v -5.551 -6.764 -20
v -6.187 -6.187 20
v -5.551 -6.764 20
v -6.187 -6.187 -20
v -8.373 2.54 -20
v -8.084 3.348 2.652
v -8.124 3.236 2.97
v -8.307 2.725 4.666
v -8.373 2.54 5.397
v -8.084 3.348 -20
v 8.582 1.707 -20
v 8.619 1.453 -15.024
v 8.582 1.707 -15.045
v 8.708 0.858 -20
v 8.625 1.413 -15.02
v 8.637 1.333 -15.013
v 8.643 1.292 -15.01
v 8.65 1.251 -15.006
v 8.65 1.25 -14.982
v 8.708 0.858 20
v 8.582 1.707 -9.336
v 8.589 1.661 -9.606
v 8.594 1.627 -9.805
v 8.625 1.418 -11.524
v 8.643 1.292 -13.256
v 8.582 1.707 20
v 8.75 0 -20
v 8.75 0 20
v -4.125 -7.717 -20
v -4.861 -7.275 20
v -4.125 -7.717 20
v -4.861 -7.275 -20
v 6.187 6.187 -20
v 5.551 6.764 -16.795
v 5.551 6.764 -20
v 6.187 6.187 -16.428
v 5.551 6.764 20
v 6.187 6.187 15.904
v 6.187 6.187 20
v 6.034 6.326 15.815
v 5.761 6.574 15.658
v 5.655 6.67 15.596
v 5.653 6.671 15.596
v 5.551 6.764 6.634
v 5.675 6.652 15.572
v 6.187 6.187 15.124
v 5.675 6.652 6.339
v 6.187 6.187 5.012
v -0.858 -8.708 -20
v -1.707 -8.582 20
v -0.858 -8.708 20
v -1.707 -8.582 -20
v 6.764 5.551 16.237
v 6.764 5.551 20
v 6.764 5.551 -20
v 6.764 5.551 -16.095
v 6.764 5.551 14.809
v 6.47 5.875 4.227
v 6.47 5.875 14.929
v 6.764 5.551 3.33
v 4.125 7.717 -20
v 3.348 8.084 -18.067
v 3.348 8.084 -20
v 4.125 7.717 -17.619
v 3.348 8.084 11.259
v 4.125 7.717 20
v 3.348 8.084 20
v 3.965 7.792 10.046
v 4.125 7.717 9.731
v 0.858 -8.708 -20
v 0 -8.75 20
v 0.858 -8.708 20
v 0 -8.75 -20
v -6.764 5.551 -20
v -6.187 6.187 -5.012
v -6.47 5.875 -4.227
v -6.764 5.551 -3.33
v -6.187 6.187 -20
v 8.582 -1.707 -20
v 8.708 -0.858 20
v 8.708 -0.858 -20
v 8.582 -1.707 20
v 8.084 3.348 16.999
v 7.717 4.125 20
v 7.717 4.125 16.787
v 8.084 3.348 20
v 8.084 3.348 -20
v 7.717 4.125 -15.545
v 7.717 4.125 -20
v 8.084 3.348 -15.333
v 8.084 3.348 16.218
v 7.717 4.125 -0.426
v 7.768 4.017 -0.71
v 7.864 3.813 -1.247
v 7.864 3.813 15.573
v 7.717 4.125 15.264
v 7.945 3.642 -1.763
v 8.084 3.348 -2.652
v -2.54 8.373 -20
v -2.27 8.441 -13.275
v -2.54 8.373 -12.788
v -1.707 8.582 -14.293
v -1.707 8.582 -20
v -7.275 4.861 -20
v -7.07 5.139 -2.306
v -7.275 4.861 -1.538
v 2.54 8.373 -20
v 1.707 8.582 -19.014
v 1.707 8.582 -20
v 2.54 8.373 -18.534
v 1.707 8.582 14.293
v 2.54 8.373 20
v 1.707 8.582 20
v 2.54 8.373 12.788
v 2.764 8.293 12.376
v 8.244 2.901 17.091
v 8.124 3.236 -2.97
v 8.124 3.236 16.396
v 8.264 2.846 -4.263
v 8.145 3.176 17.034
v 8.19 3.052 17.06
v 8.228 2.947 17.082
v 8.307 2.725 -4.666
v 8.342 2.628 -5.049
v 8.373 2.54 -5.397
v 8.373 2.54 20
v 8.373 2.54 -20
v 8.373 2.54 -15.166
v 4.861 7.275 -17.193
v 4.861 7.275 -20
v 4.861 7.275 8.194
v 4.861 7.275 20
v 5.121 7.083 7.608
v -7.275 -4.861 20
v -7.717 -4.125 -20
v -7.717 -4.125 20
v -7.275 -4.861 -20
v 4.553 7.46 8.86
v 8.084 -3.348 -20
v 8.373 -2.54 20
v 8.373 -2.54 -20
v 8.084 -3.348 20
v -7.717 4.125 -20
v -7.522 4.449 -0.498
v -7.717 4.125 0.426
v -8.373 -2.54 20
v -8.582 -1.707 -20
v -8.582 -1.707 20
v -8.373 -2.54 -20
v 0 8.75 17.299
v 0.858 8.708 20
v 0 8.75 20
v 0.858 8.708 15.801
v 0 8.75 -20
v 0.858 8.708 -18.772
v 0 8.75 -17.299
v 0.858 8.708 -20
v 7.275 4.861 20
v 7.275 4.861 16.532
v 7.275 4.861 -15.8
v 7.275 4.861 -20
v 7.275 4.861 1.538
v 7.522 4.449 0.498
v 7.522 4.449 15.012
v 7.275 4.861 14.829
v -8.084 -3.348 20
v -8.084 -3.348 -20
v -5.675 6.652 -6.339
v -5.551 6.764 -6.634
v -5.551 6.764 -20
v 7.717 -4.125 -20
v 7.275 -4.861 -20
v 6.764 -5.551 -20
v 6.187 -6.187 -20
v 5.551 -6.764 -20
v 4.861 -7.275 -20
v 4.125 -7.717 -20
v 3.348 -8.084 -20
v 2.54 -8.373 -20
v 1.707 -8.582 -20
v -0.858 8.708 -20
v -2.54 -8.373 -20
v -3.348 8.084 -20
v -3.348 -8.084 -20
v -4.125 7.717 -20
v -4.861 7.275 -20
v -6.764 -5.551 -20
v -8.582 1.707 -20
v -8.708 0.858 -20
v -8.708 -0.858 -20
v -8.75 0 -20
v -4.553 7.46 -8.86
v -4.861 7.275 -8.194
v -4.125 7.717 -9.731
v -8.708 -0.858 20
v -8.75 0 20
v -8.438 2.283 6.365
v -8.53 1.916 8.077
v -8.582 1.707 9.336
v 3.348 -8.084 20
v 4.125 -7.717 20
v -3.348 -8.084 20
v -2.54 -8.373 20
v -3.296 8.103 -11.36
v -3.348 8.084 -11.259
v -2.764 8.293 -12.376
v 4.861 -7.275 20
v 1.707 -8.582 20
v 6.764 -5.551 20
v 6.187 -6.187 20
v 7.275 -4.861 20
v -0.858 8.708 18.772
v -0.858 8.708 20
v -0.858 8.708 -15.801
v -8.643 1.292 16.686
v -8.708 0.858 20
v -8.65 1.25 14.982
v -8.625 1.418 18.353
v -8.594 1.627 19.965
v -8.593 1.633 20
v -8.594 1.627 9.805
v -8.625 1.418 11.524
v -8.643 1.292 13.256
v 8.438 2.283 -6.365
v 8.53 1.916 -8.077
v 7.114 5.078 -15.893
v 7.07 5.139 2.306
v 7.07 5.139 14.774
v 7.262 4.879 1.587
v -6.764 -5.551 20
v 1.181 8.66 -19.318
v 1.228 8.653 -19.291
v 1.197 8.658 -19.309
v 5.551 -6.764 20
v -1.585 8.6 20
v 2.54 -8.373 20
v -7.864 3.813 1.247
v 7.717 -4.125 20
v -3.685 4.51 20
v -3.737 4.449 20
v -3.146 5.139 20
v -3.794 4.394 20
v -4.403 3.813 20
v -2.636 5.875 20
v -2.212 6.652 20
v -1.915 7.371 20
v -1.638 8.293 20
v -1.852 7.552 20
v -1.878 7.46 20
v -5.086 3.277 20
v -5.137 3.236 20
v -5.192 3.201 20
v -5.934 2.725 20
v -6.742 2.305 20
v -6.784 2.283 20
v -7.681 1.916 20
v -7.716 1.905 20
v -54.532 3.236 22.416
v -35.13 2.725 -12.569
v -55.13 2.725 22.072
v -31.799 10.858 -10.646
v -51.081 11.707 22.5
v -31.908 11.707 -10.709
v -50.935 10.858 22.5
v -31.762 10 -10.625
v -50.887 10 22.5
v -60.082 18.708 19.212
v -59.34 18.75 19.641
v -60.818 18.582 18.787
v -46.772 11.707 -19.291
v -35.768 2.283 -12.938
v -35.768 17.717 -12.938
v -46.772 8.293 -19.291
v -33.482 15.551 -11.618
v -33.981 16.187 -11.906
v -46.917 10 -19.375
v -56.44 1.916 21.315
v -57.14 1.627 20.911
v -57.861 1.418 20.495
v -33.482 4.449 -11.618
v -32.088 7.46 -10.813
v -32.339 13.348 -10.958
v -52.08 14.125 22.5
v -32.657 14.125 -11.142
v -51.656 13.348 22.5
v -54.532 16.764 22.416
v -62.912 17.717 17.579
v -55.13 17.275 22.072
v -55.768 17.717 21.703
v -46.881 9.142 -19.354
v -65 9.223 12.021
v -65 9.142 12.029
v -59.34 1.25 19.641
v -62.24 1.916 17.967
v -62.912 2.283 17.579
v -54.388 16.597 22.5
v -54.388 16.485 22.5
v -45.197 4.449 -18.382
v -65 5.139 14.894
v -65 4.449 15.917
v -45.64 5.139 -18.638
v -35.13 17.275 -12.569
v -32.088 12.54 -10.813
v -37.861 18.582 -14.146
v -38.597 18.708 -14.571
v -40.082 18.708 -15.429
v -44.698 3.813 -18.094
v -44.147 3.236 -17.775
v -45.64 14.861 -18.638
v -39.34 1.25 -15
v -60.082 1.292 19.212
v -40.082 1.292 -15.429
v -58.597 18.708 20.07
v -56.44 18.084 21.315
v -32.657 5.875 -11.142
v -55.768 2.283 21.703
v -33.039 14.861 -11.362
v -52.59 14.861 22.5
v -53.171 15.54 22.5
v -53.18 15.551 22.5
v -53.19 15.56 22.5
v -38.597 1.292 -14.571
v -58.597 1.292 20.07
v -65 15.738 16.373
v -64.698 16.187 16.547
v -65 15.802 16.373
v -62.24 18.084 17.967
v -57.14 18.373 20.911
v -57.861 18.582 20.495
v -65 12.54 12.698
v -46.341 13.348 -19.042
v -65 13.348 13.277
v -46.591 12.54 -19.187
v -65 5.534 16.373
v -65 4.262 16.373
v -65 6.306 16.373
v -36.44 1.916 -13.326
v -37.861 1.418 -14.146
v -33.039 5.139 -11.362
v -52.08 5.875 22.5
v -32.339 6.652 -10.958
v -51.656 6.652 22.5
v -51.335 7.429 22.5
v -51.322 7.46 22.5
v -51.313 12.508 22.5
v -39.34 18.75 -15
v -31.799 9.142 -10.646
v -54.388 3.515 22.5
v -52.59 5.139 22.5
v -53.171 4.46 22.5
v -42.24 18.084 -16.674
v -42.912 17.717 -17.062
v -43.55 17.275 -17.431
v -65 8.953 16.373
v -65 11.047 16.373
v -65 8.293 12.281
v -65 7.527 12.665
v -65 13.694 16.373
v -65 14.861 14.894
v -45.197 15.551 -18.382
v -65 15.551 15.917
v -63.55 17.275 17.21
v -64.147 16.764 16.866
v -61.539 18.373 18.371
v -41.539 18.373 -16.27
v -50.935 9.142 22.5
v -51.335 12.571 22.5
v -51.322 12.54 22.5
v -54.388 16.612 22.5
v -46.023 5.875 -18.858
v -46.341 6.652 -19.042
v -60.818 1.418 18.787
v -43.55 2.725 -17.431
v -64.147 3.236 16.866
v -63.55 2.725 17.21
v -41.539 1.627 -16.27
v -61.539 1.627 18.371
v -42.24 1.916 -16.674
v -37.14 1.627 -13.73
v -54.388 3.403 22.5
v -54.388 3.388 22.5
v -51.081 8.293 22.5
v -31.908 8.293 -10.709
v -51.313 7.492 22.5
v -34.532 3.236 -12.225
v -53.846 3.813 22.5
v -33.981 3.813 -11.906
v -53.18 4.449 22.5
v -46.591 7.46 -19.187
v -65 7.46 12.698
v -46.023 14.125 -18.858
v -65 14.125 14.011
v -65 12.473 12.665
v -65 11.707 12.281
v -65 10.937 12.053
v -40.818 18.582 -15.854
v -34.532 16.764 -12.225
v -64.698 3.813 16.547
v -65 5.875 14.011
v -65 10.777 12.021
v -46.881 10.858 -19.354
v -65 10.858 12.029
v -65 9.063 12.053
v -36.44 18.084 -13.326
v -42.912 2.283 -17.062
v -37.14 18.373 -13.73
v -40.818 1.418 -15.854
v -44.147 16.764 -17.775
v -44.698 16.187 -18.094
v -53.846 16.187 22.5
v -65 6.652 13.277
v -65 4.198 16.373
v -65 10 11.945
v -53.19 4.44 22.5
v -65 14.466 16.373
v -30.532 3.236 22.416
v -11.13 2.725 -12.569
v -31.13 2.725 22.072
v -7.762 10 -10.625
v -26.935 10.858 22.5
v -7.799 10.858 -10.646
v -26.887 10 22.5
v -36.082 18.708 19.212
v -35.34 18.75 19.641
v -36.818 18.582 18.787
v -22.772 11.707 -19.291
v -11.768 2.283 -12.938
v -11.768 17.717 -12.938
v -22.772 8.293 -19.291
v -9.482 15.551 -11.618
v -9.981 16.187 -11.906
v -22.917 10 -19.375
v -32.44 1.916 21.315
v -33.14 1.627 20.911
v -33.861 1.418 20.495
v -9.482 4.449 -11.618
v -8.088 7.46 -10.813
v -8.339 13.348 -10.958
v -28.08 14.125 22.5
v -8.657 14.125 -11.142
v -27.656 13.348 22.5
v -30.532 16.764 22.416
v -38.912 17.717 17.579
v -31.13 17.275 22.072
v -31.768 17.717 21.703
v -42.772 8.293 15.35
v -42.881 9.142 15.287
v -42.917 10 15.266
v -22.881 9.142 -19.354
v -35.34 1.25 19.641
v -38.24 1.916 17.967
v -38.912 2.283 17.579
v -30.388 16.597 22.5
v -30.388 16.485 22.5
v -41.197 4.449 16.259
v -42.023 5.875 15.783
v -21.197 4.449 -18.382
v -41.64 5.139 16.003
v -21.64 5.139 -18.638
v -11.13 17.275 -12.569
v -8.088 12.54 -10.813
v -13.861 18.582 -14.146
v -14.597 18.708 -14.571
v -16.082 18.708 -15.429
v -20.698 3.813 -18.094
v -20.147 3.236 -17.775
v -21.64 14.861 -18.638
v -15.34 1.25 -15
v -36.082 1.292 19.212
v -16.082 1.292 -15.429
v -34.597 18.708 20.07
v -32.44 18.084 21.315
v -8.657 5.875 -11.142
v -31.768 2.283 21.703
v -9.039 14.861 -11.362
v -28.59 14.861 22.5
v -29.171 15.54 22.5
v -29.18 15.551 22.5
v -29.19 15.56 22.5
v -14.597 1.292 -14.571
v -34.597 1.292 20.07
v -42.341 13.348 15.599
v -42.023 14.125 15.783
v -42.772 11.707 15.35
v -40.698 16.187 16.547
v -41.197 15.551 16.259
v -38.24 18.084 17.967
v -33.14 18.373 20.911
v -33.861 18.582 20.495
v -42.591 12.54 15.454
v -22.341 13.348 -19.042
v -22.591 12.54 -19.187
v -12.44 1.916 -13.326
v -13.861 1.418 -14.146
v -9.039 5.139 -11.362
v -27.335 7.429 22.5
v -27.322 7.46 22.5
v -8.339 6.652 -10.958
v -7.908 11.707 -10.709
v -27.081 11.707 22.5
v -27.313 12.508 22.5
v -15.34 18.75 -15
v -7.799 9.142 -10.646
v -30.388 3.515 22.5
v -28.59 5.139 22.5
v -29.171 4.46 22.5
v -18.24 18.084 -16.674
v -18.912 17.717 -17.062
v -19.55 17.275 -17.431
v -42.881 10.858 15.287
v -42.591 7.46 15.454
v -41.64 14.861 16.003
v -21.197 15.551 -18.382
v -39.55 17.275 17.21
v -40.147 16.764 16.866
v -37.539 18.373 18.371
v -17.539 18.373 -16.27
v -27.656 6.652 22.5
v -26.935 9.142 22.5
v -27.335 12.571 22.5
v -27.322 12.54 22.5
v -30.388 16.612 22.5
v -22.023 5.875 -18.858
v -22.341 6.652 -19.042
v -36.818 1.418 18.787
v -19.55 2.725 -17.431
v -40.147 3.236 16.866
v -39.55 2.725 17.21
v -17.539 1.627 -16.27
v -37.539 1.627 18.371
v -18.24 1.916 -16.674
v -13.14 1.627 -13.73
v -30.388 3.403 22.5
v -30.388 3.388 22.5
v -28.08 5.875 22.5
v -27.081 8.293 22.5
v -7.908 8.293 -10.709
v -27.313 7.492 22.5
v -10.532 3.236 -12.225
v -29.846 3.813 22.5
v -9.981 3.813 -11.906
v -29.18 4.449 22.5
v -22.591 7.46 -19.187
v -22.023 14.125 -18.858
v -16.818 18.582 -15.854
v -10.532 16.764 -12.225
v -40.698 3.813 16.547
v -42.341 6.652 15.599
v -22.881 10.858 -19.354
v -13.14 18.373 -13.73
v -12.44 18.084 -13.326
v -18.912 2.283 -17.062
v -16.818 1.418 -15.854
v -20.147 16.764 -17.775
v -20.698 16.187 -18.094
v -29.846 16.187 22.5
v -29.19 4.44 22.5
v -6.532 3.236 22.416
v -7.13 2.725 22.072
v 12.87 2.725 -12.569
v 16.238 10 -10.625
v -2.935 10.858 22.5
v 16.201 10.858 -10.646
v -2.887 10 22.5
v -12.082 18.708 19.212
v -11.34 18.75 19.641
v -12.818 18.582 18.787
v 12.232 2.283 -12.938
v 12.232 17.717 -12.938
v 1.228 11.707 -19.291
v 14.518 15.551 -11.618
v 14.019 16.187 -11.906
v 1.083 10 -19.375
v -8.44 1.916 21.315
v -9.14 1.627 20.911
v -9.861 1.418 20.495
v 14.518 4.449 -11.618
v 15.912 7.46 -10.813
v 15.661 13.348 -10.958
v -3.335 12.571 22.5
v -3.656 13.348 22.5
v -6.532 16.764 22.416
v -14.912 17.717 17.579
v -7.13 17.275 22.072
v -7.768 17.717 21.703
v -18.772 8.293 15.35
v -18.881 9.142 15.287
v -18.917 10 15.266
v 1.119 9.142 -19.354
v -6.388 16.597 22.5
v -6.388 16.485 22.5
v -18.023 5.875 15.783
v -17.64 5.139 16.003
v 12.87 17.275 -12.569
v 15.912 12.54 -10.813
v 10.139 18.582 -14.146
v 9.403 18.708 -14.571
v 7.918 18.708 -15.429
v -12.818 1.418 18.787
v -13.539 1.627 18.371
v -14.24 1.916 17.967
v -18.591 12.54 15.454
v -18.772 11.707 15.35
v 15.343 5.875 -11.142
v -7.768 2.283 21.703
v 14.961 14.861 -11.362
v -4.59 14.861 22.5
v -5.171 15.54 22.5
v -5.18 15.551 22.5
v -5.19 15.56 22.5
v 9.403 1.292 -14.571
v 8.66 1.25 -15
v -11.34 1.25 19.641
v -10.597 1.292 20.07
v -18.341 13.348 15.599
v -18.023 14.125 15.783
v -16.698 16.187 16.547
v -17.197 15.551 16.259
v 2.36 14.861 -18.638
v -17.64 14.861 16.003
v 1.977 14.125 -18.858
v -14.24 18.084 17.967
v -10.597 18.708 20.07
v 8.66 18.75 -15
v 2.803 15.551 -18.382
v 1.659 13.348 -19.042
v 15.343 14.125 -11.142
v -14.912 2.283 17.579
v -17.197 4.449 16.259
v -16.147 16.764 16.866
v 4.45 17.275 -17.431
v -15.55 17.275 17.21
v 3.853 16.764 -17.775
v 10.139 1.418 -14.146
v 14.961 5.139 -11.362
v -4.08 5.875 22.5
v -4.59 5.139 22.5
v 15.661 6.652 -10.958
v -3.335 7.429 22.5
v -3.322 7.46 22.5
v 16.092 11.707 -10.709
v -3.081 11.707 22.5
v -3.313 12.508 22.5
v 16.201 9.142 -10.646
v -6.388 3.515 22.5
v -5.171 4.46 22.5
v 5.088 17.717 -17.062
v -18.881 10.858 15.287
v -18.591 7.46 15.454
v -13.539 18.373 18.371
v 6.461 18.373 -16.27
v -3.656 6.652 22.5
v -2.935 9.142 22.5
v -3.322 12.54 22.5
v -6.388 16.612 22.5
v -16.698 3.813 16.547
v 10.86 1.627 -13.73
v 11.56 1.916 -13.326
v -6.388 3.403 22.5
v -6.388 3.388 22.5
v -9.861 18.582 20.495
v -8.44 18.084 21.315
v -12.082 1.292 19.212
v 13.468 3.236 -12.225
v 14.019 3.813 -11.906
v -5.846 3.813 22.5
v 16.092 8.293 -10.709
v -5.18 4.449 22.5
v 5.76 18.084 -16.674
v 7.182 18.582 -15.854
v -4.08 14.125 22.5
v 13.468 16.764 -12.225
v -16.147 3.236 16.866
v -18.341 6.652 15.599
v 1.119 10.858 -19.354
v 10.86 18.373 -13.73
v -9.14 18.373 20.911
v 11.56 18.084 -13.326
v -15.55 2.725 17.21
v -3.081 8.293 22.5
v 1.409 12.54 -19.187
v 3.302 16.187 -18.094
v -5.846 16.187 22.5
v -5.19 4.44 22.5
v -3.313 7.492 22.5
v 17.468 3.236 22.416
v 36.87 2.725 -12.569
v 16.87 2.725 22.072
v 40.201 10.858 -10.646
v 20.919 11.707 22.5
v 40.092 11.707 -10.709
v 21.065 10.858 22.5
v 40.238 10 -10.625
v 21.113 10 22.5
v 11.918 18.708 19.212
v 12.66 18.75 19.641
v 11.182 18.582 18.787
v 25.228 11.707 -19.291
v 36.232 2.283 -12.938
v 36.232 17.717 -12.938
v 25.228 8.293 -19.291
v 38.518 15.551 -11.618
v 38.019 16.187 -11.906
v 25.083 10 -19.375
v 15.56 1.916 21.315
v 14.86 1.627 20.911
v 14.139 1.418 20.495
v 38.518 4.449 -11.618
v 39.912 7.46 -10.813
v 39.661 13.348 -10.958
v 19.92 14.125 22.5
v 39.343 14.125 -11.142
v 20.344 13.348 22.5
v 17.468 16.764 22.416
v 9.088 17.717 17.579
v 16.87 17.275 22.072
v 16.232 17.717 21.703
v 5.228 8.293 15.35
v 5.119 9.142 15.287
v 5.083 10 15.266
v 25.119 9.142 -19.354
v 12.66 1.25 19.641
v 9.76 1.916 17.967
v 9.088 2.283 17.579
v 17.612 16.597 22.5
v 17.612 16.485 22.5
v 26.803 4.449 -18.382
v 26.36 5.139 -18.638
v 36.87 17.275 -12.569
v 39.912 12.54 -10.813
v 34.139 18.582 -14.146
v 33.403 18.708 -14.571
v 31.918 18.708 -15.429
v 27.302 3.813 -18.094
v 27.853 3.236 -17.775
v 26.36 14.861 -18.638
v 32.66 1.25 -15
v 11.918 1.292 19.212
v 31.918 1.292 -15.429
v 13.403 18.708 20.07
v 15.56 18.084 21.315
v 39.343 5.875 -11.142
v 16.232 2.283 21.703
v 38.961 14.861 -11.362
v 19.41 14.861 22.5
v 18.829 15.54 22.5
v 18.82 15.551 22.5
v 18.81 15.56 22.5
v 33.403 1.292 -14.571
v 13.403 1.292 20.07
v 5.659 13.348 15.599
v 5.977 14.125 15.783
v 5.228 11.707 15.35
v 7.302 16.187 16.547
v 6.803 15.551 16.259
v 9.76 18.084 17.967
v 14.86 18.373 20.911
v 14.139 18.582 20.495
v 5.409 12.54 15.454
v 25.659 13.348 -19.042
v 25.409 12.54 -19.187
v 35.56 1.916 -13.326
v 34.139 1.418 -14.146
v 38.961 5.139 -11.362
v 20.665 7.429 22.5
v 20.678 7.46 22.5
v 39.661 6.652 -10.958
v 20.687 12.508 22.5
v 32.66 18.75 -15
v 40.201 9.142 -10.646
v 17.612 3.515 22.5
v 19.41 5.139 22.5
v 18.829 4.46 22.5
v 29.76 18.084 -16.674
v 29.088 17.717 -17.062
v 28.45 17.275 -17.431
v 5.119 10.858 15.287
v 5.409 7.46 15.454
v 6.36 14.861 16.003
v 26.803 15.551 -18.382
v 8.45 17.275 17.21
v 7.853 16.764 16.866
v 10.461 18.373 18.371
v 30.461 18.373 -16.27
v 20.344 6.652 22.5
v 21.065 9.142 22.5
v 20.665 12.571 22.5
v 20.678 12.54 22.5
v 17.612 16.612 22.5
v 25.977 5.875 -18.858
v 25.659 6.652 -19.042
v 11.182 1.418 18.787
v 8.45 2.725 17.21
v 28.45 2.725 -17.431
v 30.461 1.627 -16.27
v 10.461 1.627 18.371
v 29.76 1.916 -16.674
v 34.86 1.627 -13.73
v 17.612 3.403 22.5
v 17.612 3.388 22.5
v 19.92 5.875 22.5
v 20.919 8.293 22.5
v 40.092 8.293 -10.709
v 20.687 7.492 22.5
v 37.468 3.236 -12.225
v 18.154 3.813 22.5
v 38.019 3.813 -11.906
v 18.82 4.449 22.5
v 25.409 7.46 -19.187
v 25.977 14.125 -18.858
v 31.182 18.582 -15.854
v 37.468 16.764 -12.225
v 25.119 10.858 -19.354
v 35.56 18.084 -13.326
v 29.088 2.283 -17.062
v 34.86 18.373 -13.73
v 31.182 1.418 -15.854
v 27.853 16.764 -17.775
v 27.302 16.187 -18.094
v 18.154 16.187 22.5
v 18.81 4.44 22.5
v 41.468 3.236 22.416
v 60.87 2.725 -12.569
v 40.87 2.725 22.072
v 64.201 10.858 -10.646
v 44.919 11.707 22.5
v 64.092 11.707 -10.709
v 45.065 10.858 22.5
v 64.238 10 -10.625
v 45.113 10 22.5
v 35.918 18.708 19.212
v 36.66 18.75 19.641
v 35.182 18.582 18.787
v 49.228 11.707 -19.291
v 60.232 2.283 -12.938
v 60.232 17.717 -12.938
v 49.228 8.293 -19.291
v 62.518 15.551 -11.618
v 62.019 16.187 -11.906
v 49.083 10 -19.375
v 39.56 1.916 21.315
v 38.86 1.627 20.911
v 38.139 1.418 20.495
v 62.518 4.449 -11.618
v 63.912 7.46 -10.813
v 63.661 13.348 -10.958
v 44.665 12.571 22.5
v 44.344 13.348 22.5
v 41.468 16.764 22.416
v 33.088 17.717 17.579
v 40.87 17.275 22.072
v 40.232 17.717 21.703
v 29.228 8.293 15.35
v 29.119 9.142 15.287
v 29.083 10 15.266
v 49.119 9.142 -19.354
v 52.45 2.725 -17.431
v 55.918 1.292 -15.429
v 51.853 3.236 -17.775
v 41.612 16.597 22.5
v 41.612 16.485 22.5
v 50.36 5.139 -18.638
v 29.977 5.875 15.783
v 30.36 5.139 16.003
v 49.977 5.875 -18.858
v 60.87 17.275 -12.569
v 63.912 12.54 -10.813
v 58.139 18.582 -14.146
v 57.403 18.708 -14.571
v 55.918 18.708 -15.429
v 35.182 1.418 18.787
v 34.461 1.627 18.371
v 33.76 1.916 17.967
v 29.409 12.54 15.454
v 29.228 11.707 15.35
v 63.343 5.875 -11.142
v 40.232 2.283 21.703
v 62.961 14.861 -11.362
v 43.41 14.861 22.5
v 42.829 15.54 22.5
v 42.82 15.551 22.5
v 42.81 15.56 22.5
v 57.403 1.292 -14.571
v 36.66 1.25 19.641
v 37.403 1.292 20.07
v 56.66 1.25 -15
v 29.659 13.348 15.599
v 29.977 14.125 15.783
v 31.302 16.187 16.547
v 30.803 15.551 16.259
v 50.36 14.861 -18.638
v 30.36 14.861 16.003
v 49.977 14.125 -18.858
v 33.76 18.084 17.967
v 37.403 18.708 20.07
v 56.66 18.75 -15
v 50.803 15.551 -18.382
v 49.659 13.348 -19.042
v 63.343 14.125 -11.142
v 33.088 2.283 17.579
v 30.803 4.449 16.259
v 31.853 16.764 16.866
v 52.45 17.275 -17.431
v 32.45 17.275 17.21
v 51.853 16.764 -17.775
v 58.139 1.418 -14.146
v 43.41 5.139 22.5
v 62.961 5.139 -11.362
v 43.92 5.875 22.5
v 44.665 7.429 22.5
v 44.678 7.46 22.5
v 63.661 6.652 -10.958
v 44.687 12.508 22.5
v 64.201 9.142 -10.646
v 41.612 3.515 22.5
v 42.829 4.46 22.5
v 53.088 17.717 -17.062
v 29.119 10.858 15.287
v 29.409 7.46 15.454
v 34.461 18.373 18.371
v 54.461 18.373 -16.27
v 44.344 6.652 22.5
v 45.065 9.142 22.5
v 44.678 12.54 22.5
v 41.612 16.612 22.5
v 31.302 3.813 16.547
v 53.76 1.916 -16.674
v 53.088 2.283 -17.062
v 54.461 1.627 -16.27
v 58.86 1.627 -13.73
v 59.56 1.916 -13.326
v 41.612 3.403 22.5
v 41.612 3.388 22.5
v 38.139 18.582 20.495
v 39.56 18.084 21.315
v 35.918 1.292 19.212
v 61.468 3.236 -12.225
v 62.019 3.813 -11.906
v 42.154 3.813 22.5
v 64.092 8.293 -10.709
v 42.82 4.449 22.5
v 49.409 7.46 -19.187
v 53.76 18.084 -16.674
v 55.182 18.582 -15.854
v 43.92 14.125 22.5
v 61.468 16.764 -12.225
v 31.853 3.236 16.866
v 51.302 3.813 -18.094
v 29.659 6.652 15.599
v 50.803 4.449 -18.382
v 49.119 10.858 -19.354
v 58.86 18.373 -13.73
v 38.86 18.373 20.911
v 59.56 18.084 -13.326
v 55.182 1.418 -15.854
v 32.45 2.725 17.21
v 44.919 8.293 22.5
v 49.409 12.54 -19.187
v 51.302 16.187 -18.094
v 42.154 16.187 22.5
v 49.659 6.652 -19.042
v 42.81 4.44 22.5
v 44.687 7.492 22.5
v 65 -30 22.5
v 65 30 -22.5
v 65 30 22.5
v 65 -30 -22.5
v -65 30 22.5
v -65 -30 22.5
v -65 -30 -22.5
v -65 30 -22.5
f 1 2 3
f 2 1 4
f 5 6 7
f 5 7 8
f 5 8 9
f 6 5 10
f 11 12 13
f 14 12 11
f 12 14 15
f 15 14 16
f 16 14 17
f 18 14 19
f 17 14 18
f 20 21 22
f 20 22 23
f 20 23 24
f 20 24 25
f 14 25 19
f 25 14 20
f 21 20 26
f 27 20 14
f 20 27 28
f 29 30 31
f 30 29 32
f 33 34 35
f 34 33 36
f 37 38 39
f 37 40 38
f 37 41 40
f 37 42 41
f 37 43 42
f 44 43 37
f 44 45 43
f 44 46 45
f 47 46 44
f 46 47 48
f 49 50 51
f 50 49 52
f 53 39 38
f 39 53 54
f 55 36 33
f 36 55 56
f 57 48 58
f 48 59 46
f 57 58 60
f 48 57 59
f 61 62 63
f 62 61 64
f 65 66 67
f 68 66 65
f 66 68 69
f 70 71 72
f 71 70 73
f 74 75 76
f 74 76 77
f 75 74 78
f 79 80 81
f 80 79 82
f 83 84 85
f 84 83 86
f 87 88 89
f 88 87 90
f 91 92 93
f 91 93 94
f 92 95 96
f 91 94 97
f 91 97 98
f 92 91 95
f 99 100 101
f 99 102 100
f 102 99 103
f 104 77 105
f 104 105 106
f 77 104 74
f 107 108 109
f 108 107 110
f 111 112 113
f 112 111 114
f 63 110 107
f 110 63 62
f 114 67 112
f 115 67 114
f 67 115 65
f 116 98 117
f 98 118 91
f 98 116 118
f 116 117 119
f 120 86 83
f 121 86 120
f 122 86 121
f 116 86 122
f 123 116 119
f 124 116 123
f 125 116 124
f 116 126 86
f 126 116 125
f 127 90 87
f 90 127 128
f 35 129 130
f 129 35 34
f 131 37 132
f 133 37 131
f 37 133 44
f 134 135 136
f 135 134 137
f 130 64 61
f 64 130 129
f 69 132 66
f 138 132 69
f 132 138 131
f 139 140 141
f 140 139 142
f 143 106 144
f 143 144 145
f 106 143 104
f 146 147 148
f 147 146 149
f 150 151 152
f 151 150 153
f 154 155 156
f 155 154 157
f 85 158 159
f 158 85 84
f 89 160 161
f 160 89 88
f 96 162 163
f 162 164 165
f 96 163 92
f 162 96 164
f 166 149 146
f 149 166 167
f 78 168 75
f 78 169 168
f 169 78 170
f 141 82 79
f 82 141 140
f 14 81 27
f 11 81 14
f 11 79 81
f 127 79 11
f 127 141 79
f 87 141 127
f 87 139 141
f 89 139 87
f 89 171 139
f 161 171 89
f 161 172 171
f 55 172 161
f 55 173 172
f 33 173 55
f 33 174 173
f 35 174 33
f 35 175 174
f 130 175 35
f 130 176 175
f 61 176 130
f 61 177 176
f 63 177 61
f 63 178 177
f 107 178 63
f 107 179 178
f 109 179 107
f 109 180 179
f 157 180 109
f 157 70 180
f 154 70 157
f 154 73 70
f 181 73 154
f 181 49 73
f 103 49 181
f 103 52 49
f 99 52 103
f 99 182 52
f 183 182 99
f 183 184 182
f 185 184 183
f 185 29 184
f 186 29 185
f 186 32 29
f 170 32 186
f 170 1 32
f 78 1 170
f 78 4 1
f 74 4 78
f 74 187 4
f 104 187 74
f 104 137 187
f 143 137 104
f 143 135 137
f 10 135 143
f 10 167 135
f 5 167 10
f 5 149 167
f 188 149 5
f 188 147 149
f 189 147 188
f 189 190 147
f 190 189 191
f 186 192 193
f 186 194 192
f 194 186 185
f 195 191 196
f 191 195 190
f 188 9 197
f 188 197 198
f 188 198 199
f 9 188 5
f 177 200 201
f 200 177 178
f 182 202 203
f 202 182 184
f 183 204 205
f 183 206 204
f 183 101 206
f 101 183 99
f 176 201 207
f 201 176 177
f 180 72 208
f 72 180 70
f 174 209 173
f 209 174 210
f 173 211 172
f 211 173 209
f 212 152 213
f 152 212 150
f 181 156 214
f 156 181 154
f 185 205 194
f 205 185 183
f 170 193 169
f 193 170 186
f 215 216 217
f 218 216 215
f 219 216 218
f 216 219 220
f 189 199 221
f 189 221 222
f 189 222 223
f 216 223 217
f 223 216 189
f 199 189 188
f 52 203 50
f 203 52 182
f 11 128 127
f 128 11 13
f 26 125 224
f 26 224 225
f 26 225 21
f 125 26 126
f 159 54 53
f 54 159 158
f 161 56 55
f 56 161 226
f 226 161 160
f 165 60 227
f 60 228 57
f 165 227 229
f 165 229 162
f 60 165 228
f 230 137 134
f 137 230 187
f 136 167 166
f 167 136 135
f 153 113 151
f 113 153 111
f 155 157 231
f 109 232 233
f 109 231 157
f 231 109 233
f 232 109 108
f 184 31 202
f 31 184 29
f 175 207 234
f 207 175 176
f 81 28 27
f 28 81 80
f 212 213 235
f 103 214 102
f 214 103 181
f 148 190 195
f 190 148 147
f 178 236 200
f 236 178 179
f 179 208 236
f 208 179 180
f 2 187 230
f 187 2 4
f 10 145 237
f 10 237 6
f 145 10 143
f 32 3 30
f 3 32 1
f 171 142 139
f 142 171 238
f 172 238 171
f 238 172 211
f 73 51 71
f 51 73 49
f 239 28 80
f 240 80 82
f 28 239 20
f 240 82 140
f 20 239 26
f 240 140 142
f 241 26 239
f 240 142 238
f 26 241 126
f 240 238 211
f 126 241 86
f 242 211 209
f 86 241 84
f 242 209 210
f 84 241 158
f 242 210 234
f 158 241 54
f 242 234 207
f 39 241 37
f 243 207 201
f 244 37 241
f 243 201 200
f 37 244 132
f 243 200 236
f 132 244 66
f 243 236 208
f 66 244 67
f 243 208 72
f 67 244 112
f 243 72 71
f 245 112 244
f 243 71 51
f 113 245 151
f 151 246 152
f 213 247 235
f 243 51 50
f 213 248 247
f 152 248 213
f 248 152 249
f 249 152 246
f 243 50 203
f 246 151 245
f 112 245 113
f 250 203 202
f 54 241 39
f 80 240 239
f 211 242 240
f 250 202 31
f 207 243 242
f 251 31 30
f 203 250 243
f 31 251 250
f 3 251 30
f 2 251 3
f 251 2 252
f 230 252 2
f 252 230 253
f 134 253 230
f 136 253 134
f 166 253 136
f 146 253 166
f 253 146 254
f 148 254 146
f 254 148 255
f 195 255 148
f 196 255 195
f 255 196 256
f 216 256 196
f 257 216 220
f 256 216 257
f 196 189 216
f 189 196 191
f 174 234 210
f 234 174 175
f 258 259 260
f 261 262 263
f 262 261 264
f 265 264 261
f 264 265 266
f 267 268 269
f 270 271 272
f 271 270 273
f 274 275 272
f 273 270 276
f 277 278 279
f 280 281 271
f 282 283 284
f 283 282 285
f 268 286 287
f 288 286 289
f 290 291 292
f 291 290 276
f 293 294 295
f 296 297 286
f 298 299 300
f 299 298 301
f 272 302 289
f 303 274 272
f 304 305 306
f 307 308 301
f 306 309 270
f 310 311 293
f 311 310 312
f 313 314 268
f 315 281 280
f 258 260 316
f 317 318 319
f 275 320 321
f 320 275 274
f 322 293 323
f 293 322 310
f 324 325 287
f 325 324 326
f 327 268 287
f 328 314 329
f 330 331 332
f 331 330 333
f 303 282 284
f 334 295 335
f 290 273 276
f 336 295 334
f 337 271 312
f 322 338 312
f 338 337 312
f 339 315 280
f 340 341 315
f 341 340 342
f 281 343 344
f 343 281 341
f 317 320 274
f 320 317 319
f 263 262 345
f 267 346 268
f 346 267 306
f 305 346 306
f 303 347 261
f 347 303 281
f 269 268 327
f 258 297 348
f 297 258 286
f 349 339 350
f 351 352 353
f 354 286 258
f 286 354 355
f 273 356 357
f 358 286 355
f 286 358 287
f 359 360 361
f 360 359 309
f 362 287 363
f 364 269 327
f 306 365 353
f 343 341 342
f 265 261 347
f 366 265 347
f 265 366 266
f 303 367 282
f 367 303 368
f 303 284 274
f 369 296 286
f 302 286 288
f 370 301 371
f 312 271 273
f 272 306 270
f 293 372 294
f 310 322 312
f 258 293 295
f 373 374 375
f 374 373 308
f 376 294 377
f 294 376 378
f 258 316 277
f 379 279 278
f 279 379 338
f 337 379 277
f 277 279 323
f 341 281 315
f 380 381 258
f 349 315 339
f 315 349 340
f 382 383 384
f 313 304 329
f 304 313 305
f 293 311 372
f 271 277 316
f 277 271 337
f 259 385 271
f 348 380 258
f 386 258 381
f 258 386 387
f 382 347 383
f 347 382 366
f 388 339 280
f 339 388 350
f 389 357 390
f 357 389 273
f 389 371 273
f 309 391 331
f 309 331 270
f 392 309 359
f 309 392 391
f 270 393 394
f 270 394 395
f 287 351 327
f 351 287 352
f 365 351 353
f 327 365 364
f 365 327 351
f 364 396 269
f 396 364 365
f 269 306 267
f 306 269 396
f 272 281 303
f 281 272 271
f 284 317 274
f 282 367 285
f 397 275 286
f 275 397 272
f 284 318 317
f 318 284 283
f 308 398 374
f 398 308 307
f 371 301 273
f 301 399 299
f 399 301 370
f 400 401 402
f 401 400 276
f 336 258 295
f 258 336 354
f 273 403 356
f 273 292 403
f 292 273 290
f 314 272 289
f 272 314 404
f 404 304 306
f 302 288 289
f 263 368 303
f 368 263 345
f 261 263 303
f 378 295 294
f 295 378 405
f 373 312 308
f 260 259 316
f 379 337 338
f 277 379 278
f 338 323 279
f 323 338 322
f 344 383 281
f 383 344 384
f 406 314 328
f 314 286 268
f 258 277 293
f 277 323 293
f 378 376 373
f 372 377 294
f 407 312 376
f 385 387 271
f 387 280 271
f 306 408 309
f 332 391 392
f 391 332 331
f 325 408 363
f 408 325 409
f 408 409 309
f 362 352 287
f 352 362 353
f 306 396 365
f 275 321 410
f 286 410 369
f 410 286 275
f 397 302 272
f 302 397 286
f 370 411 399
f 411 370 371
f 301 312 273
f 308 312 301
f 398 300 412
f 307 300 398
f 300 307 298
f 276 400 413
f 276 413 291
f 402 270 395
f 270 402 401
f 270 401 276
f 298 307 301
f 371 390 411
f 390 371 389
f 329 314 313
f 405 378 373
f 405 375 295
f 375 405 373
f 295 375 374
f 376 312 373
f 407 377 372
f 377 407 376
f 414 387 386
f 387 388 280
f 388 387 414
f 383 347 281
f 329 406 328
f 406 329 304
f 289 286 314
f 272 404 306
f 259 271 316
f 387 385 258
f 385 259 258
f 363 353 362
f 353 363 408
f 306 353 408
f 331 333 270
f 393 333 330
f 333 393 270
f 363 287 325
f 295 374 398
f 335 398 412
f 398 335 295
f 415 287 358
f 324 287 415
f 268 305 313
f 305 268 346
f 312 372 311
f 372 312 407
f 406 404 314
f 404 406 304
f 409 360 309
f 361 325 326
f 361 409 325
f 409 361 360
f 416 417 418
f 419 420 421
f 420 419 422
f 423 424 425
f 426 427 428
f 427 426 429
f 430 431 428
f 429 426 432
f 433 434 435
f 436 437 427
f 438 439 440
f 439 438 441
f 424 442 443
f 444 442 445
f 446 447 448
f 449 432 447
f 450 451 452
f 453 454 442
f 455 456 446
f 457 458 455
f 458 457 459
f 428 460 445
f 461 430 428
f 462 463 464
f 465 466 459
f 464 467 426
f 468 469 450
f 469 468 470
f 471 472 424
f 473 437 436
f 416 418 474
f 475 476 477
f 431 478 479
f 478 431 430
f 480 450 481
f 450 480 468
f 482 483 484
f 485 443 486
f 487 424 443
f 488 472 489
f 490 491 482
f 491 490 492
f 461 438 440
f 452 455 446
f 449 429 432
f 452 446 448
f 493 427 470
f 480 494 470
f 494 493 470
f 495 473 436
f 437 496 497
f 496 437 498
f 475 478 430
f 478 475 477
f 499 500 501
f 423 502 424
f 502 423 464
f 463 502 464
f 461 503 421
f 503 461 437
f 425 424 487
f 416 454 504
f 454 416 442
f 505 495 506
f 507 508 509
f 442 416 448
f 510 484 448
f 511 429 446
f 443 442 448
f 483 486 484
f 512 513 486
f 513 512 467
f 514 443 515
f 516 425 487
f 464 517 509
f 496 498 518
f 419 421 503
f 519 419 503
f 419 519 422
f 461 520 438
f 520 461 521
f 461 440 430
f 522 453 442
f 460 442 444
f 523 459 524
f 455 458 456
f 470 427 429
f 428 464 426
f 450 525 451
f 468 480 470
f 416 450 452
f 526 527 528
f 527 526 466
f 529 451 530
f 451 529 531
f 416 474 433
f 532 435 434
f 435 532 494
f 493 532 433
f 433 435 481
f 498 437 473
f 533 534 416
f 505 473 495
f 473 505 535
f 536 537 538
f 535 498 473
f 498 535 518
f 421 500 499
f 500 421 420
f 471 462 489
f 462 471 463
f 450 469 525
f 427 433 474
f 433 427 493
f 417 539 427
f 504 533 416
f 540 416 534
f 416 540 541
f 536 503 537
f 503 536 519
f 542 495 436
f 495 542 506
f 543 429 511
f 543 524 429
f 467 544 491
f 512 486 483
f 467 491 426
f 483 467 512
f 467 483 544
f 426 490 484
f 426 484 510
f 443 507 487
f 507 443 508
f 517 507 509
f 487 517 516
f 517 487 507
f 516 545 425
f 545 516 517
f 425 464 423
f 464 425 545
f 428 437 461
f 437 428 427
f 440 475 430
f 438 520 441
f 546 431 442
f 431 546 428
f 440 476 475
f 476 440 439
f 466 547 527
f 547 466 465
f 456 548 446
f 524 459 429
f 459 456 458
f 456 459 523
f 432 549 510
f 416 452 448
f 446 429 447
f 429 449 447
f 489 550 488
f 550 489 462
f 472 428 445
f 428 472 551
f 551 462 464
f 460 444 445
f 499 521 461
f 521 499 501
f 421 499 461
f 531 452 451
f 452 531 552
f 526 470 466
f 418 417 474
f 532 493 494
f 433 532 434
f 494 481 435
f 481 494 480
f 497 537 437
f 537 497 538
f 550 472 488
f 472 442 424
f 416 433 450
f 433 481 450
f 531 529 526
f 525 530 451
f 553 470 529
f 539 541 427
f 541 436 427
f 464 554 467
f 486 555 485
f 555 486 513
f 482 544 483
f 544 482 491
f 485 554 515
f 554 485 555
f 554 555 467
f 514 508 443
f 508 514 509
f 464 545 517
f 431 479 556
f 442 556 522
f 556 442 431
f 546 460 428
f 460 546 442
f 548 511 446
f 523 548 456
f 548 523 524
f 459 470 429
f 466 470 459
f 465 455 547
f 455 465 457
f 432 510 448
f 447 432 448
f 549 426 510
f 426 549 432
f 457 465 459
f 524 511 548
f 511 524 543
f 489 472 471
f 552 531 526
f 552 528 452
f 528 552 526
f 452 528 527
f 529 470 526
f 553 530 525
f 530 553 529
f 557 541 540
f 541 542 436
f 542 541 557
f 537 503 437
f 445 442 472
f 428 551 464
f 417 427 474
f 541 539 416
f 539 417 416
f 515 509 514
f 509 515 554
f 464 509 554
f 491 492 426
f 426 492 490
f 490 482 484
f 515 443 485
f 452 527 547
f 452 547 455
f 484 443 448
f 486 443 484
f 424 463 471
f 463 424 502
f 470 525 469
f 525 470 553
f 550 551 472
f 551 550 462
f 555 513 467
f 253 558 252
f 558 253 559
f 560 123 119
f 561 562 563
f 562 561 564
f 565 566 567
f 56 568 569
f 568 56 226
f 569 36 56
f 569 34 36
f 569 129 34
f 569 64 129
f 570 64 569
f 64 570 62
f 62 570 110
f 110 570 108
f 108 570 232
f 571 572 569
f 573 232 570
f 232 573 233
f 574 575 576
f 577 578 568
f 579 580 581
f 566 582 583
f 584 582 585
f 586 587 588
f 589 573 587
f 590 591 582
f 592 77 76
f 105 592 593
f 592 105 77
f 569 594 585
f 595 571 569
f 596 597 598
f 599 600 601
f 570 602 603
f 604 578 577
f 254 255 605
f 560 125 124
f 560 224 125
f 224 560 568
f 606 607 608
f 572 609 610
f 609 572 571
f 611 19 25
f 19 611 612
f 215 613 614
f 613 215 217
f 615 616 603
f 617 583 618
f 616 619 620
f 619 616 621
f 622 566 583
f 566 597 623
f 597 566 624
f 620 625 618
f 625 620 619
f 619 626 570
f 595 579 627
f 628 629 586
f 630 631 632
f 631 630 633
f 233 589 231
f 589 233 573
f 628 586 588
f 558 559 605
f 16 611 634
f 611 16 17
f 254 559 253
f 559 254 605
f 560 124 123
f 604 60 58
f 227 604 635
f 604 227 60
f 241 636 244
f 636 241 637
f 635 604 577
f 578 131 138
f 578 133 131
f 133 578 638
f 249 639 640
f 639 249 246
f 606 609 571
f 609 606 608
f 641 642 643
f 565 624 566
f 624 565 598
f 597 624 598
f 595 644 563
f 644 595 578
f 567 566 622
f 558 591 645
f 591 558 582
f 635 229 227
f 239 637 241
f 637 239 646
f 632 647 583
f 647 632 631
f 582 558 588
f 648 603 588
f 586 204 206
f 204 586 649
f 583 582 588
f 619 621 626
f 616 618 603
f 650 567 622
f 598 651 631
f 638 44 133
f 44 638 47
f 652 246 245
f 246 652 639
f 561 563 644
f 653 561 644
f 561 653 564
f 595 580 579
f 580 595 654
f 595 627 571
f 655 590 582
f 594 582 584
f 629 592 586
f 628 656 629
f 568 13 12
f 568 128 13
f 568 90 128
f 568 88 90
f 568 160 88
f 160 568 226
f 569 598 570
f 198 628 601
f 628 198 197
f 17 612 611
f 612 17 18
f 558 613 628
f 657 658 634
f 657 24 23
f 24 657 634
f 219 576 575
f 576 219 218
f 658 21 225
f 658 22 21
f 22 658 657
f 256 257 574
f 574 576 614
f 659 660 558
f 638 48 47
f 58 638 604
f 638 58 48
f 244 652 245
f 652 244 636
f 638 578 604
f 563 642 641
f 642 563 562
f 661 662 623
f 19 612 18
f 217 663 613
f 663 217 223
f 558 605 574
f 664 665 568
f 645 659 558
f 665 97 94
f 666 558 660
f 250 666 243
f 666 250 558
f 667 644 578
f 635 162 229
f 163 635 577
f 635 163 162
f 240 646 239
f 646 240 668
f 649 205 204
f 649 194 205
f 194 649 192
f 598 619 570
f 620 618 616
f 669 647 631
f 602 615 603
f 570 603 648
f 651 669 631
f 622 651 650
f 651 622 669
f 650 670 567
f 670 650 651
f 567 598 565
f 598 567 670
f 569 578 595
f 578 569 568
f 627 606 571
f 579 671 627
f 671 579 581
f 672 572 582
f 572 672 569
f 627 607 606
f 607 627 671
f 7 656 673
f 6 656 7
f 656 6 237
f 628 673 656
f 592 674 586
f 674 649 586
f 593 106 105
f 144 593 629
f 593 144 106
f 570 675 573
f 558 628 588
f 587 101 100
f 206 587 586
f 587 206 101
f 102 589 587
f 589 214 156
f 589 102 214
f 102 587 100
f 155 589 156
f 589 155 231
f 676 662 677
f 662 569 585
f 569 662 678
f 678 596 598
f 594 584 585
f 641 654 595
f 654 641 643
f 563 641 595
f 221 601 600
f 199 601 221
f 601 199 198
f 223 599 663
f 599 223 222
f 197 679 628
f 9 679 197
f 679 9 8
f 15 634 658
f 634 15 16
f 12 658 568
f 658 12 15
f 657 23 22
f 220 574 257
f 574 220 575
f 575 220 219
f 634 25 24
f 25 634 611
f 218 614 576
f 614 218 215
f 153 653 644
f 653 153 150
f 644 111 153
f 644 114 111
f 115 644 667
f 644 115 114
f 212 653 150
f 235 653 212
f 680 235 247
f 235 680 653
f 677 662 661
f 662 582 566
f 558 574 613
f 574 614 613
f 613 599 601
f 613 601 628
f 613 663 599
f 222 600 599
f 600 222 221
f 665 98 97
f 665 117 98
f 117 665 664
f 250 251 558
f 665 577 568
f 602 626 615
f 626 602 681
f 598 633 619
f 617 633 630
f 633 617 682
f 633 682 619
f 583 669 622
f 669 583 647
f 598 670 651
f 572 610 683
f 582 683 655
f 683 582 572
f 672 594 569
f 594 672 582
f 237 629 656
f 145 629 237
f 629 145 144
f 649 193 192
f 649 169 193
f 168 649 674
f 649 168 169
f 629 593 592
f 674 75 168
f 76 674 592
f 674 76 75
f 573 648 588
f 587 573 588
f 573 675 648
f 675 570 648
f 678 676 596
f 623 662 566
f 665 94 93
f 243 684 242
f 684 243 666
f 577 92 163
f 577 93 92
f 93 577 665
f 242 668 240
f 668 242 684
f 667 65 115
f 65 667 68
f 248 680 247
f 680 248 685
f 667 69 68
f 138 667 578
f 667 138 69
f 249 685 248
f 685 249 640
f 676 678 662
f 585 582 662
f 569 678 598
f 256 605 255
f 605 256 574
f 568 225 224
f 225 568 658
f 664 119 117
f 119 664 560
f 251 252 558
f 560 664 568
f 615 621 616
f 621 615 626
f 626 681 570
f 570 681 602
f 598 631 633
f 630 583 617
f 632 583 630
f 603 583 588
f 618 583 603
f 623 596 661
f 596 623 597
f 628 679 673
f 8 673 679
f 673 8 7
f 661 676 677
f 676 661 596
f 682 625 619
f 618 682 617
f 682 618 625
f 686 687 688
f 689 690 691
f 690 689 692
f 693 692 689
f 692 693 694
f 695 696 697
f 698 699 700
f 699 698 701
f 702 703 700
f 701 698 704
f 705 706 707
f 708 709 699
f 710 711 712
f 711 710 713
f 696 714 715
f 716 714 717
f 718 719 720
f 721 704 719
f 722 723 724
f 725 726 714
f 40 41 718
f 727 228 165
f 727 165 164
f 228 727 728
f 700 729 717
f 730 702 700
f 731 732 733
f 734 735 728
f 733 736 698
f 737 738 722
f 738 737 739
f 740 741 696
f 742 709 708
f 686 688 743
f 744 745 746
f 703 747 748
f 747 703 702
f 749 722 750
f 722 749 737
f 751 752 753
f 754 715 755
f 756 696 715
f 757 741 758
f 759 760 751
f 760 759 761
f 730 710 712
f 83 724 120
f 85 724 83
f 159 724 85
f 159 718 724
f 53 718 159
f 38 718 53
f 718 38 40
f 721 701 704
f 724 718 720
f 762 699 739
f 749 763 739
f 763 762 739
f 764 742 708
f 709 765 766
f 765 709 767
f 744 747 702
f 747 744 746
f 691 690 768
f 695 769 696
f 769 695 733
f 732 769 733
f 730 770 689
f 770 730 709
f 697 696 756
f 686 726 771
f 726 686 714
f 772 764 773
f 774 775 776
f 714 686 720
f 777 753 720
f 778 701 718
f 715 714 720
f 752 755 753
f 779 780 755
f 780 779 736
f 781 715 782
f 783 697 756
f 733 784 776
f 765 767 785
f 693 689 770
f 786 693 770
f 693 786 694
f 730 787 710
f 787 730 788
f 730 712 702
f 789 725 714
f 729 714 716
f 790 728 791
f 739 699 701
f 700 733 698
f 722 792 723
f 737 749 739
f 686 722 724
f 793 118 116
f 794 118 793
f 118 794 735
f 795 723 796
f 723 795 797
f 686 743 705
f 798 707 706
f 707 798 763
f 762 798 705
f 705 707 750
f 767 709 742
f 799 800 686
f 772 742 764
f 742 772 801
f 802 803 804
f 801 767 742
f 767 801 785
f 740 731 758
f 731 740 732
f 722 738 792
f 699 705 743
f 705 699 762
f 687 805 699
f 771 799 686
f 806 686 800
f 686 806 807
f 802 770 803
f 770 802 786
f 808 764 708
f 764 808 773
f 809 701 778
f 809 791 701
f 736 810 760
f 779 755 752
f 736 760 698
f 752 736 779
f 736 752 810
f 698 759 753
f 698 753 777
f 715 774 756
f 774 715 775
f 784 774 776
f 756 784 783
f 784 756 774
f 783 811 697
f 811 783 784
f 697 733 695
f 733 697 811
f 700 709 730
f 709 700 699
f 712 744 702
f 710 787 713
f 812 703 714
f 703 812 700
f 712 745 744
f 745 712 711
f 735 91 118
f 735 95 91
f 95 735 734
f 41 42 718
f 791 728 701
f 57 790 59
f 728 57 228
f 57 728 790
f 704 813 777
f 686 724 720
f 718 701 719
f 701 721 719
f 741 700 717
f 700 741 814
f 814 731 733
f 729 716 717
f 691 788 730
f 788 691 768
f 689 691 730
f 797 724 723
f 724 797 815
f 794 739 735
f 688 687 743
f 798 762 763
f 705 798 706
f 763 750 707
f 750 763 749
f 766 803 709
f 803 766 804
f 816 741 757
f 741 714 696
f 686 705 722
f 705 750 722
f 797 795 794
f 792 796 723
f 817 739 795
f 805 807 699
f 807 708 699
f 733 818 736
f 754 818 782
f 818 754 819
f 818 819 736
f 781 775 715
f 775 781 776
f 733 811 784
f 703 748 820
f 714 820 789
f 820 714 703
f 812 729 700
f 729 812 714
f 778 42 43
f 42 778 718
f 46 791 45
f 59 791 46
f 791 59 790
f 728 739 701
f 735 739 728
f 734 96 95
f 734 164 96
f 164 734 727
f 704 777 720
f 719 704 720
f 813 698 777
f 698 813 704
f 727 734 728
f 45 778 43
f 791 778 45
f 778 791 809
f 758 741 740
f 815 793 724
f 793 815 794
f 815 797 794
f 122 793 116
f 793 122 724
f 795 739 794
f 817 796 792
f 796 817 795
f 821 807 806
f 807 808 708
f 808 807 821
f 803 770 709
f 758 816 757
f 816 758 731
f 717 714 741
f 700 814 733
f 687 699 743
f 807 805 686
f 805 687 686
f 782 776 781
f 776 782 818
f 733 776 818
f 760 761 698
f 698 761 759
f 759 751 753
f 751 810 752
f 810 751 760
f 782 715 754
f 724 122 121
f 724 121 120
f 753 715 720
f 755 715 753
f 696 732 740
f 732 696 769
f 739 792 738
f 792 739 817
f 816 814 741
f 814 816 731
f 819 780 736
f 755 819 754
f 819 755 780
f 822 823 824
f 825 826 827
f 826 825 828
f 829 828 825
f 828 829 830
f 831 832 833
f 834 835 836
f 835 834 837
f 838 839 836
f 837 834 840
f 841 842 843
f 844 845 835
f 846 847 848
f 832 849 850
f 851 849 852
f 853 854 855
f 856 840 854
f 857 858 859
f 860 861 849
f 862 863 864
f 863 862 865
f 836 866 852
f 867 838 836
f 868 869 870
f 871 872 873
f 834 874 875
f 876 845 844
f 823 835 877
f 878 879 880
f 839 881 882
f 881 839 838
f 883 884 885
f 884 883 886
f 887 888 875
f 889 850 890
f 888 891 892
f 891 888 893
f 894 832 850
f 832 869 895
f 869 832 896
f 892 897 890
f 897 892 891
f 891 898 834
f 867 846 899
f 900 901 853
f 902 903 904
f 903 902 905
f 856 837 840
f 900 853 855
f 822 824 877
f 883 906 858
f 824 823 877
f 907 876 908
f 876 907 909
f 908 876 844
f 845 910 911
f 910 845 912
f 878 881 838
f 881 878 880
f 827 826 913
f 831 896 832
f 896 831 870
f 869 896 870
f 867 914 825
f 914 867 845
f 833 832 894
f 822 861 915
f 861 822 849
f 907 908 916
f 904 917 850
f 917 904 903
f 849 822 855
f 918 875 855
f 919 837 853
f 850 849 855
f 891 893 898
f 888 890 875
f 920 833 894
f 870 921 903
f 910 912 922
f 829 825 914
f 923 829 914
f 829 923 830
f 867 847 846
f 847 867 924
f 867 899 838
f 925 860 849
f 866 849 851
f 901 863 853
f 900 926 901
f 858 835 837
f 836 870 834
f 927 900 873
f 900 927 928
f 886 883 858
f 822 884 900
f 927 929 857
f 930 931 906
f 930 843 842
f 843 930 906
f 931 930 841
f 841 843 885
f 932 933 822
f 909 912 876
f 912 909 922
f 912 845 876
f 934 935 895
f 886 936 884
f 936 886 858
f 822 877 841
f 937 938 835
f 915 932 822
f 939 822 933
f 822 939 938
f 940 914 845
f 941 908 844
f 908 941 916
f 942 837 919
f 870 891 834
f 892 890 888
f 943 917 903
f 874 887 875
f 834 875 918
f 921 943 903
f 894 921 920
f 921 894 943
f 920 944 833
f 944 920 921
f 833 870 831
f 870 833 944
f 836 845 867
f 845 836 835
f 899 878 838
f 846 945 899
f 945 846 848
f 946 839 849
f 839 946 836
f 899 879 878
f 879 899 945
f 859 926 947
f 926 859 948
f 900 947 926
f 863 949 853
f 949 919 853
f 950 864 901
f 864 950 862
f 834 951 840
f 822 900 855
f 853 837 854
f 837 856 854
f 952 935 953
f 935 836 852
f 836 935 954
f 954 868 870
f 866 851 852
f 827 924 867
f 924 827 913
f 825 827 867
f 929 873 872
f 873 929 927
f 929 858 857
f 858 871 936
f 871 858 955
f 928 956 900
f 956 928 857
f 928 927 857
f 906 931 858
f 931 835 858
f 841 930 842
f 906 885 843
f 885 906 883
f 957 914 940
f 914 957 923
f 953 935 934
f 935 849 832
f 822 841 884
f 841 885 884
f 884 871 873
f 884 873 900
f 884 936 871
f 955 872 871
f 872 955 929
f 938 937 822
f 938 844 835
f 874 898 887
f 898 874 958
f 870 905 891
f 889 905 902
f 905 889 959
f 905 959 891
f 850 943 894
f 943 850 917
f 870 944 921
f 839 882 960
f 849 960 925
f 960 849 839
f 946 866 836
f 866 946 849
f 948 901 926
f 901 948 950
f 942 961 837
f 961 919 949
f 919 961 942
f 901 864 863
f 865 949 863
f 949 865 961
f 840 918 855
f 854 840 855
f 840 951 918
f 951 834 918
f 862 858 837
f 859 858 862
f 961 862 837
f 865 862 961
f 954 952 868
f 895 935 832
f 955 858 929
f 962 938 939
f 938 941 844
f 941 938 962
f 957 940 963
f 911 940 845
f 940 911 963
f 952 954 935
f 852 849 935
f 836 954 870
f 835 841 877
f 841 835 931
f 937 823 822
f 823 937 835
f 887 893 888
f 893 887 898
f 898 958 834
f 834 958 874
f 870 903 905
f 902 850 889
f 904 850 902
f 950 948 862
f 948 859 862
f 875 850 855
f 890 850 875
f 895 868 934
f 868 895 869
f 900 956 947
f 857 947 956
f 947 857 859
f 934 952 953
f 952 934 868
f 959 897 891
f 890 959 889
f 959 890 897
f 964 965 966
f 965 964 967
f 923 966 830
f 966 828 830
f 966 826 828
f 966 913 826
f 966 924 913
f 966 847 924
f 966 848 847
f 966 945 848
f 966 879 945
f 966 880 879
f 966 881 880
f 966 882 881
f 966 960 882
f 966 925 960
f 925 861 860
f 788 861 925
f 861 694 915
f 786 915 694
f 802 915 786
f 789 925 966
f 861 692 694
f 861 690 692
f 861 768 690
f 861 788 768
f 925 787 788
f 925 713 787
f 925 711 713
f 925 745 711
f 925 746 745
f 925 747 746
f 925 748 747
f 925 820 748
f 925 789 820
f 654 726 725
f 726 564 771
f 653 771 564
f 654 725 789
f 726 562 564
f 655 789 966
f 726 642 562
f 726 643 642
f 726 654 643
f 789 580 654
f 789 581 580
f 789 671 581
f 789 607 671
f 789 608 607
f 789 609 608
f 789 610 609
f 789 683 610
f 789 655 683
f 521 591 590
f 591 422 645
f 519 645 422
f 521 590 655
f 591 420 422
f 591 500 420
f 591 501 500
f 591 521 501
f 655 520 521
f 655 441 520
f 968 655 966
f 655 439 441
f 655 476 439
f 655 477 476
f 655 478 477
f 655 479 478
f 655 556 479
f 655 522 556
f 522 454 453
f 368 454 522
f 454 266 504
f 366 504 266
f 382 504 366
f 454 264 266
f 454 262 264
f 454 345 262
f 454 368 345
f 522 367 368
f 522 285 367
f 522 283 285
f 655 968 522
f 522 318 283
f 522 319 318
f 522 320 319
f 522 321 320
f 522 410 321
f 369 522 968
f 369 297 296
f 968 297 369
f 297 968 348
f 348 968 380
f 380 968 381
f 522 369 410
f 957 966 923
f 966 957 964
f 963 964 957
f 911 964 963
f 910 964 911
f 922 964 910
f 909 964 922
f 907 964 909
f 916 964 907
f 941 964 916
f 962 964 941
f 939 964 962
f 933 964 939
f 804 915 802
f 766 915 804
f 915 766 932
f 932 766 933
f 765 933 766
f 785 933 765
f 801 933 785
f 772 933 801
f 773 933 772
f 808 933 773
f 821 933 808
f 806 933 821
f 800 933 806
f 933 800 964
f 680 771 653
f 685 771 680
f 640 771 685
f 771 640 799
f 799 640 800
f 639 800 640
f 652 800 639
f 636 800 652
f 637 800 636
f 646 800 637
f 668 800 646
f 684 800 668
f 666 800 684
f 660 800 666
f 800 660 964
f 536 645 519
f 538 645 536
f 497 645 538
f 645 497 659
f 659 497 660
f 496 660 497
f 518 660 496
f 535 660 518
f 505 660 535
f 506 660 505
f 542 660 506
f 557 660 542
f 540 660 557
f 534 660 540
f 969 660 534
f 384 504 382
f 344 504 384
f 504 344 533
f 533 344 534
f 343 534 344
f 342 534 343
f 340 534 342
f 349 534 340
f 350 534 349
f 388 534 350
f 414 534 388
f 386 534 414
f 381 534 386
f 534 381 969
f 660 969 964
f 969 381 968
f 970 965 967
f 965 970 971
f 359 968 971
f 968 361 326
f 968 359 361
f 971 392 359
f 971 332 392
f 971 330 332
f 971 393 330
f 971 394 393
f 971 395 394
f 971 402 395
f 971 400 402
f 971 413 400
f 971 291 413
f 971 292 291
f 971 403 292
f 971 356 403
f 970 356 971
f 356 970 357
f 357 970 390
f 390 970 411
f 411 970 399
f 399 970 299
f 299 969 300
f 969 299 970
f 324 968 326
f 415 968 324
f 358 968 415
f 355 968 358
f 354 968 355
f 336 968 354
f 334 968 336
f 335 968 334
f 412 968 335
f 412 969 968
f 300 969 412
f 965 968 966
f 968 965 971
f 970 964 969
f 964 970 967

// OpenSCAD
// --- Dimensions ---
rack_length = 130;    // Total length along X (mm)
rack_depth = 60;      // Total depth along Y (mm)
rack_height = 45;     // Total height along Z (mm)

tube_hole_diameter = 17.5; // Diameter of the tube hole (mm)
tube_hole_radius = tube_hole_diameter / 2;
tube_hole_depth = 40;    // Depth of the cylindrical cut (mm)

num_tubes = 5;         // Number of tubes to hold
spacing_x = 24;        // Distance between centers of holes along X (mm)

tilt_angle = 30;       // Tilt angle in degrees from vertical (YZ plane)

// --- Constants ---
$fn = 64; // High resolution for curves

// --- Base Block Definition ---
module base_block() {
    cube([rack_length, rack_depth, rack_height], center = true);
}

// --- Hole Geometry Calculation ---
// The holes are centered along X. We need to find the starting X positions.
// Total span for 5 tubes: (5-1) * spacing_x = 4 * 24 = 96 mm.
// Centered on origin, so start offset is -96/2 = -48 mm from center.
module hole_positions() {
    for (i = [0 : num_tubes - 1]) {
        x_pos = (-((num_tubes - 1) * spacing_x) / 2) + (i * spacing_x);
        // The holes are centered on the block, so X is relative to origin.
        translate([x_pos, 0, 0]) {
            // We will define the cylinder cut later using transformations
        }
    }
}

// --- Hole Cutting Module ---
module tube_hole(center_x) {
    // The hole axis starts at Z = rack_height/2 (top face center) and goes down.
    // It is tilted 30 degrees in the YZ plane, moving towards +Y.
    // Rotation around X-axis by -tilt_angle tilts it towards +Y.

    // 1. Define the cylinder shape (the material to be removed)
    cylinder(h = tube_hole_depth, r = tube_hole_radius, center = true);

    // 2. Apply transformations:
    // a) Translate X to the correct position
    translate([center_x, 0, 0]) {
        // b) Rotate around the X-axis by -tilt_angle (to tilt it towards +Y)
        rotate([0, -tilt_angle, 0]) {
            // c) Translate along the axis of the cylinder to position its entry point correctly.
            // The hole enters at Z = rack_height/2. Since the cylinder is centered on its own origin,
            // we need to move it so that its top face aligns with the top surface of the block (Z=rack_height/2).

            // When tilted by -30 degrees around X:
            // The Z-axis maps to a vector in the YZ plane.
            // The entry point is at Z = rack_height/2.
            // We need the cylinder's center to be positioned such that its top face (at z=tube_hole_depth/2 relative to its local origin)
            // aligns with the block's top surface, considering the tilt.

            // Let's simplify: The hole axis starts at Z = rack_height/2 on the XY plane projection.
            // The cylinder length is tube_hole_depth.
            // We want the center of the cylinder to be positioned such that its exit point is inside the block, and its entry point is flush with the top surface (Z=rack_height/2).

            // If we align the cylinder's local Z-axis with the tilted axis:
            // The distance from the origin along the tilted axis to the entry face must be 0.
            // Since the tilt is in YZ plane, the projection of the center onto the XY plane will shift.

            // Let's use a simpler approach for positioning: Define the cylinder centered at its final position, and then translate it so its top surface hits Z=rack_height/2.

            // The axis vector direction (normalized):
            // Original Z-axis = [0, 0, 1]
            // Rotated by -30 deg around X: New Z' = [0, sin(30), cos(30)] (if we rotate the coordinate system)
            // Or, if rotating the object: The local Z axis becomes [0, sin(tilt_angle), cos(tilt_angle)].

            // We want the cylinder to start at Z=rack_height/2.
            // If we center the cylinder at (X_center, Y_center, Z_center) in world coordinates, its top face is defined by the intersection of the tilted axis with a plane perpendicular to it, located at distance tube_hole_depth/2 from the center along the axis.

            // For simplicity and robustness against floating point errors, we will use linear extrusion for the cut path if possible, but since the hole must be cylindrical (constant radius), rotation is necessary.

            // Let's place the cylinder such that its local Z-axis points along the tilt direction:
            // The center of the cylinder needs to be translated so that when rotated, its top face aligns with Z=rack_height/2.

            // Center offset calculation (Approximation based on geometry):
            // If we rotate by -30 degrees around X, the local Z-axis becomes [0, sin(30), cos(30)].
            // The center of the cylinder should be placed such that its top face is at Z=rack_height/2.

            // Let's place the cylinder centered vertically (Z=0) and then translate it up so its bottom edge aligns with the required entry point, accounting for tilt.
            // Since we are cutting *into* the block from the top surface (Z = rack_height/2), we need to position the center of the cylinder such that the plane perpendicular to the axis passing through Z=rack_height/2 is one end face.

            // The distance along the tilted axis from the entry point to the center is tube_hole_depth / 2.
            // In world coordinates, this offset vector (from entry point) is:
            // Offset = [0, (tube_hole_depth/2)*sin(tilt_angle), (tube_hole_depth/2)*cos(tilt_angle)]

            // Entry point in world coords: [center_x, 0, rack_height/2]
            // Center of cylinder required: [center_x, (tube_hole_depth/2)*sin(tilt_angle), rack_height/2 - (tube_hole_depth/2)*cos(tilt_angle)]

            translate([0, (tube_hole_depth/2) * sin(tilt_angle), -(tube_hole_depth/2) * cos(tilt_angle)]) {
                // Now the cylinder is centered correctly relative to its entry point on Z=rack_height/2.
                cylinder(h = tube_hole_depth, r = tube_hole_radius);
            }
        }
    }
}

// --- Final Assembly ---
difference() {
    // 1. The solid block
    base_block();

    // 2. Subtract the five holes
    union() {
        for (i = [0 : num_tubes - 1]) {
            x_pos = (-((num_tubes - 1) * spacing_x) / 2) + (i * spacing_x);
            tube_hole(center_x = x_pos);
        }
    }
}
